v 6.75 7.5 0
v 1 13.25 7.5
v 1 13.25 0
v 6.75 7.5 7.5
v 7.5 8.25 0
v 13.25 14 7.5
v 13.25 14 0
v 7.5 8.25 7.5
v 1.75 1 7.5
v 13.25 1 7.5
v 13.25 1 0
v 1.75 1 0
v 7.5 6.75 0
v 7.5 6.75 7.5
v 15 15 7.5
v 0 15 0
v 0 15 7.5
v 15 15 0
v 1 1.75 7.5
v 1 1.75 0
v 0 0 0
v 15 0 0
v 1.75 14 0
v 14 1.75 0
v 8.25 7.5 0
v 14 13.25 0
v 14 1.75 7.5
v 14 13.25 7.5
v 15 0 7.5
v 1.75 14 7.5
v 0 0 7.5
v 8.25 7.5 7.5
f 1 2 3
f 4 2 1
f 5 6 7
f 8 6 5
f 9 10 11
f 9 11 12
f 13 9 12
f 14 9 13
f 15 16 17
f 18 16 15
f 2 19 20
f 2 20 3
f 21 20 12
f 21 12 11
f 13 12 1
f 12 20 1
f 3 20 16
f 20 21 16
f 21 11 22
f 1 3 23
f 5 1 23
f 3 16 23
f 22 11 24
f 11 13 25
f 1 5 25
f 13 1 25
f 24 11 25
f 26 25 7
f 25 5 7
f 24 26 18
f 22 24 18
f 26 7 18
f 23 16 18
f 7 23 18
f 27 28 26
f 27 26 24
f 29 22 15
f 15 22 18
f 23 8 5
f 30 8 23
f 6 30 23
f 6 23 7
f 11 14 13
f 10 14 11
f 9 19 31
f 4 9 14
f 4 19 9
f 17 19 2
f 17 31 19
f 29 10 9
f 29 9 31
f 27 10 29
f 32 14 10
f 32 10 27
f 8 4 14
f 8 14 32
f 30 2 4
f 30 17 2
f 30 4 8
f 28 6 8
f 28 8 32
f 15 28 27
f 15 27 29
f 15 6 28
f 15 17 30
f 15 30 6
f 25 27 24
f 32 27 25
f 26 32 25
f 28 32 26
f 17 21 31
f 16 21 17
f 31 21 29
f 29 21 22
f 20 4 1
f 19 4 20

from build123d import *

# Parameters (mm, degrees)
SKETCH_W     = 15
SKETCH_H     = 15
PAD_DEPTH    = 7.5
POCKET_DEPTH = 7.501


with BuildPart() as part:
    # Sketch → Pad (new body)
    with BuildSketch(Plane.XY):
        with Locations((7.5, 7.5)):
            Rectangle(SKETCH_W, SKETCH_H)
    extrude(amount=PAD_DEPTH)

    # Sketch005 (on Face6 of Pad) → Pocket (cut, through all)
    with BuildSketch(Plane.XY.offset(7.5)):
        Polygon((1.75, 14), (13.25, 14), (7.5, 8.25), align=None)
        Polygon((1, 13.25), (6.75, 7.5), (1, 1.75), align=None)
        Polygon((1.75, 1), (7.5, 6.75), (13.25, 1), align=None)
        Polygon((8.25, 7.5), (14, 13.25), (14, 1.75), align=None)
    extrude(amount=-POCKET_DEPTH, mode=Mode.SUBTRACT)


solid = part.part
